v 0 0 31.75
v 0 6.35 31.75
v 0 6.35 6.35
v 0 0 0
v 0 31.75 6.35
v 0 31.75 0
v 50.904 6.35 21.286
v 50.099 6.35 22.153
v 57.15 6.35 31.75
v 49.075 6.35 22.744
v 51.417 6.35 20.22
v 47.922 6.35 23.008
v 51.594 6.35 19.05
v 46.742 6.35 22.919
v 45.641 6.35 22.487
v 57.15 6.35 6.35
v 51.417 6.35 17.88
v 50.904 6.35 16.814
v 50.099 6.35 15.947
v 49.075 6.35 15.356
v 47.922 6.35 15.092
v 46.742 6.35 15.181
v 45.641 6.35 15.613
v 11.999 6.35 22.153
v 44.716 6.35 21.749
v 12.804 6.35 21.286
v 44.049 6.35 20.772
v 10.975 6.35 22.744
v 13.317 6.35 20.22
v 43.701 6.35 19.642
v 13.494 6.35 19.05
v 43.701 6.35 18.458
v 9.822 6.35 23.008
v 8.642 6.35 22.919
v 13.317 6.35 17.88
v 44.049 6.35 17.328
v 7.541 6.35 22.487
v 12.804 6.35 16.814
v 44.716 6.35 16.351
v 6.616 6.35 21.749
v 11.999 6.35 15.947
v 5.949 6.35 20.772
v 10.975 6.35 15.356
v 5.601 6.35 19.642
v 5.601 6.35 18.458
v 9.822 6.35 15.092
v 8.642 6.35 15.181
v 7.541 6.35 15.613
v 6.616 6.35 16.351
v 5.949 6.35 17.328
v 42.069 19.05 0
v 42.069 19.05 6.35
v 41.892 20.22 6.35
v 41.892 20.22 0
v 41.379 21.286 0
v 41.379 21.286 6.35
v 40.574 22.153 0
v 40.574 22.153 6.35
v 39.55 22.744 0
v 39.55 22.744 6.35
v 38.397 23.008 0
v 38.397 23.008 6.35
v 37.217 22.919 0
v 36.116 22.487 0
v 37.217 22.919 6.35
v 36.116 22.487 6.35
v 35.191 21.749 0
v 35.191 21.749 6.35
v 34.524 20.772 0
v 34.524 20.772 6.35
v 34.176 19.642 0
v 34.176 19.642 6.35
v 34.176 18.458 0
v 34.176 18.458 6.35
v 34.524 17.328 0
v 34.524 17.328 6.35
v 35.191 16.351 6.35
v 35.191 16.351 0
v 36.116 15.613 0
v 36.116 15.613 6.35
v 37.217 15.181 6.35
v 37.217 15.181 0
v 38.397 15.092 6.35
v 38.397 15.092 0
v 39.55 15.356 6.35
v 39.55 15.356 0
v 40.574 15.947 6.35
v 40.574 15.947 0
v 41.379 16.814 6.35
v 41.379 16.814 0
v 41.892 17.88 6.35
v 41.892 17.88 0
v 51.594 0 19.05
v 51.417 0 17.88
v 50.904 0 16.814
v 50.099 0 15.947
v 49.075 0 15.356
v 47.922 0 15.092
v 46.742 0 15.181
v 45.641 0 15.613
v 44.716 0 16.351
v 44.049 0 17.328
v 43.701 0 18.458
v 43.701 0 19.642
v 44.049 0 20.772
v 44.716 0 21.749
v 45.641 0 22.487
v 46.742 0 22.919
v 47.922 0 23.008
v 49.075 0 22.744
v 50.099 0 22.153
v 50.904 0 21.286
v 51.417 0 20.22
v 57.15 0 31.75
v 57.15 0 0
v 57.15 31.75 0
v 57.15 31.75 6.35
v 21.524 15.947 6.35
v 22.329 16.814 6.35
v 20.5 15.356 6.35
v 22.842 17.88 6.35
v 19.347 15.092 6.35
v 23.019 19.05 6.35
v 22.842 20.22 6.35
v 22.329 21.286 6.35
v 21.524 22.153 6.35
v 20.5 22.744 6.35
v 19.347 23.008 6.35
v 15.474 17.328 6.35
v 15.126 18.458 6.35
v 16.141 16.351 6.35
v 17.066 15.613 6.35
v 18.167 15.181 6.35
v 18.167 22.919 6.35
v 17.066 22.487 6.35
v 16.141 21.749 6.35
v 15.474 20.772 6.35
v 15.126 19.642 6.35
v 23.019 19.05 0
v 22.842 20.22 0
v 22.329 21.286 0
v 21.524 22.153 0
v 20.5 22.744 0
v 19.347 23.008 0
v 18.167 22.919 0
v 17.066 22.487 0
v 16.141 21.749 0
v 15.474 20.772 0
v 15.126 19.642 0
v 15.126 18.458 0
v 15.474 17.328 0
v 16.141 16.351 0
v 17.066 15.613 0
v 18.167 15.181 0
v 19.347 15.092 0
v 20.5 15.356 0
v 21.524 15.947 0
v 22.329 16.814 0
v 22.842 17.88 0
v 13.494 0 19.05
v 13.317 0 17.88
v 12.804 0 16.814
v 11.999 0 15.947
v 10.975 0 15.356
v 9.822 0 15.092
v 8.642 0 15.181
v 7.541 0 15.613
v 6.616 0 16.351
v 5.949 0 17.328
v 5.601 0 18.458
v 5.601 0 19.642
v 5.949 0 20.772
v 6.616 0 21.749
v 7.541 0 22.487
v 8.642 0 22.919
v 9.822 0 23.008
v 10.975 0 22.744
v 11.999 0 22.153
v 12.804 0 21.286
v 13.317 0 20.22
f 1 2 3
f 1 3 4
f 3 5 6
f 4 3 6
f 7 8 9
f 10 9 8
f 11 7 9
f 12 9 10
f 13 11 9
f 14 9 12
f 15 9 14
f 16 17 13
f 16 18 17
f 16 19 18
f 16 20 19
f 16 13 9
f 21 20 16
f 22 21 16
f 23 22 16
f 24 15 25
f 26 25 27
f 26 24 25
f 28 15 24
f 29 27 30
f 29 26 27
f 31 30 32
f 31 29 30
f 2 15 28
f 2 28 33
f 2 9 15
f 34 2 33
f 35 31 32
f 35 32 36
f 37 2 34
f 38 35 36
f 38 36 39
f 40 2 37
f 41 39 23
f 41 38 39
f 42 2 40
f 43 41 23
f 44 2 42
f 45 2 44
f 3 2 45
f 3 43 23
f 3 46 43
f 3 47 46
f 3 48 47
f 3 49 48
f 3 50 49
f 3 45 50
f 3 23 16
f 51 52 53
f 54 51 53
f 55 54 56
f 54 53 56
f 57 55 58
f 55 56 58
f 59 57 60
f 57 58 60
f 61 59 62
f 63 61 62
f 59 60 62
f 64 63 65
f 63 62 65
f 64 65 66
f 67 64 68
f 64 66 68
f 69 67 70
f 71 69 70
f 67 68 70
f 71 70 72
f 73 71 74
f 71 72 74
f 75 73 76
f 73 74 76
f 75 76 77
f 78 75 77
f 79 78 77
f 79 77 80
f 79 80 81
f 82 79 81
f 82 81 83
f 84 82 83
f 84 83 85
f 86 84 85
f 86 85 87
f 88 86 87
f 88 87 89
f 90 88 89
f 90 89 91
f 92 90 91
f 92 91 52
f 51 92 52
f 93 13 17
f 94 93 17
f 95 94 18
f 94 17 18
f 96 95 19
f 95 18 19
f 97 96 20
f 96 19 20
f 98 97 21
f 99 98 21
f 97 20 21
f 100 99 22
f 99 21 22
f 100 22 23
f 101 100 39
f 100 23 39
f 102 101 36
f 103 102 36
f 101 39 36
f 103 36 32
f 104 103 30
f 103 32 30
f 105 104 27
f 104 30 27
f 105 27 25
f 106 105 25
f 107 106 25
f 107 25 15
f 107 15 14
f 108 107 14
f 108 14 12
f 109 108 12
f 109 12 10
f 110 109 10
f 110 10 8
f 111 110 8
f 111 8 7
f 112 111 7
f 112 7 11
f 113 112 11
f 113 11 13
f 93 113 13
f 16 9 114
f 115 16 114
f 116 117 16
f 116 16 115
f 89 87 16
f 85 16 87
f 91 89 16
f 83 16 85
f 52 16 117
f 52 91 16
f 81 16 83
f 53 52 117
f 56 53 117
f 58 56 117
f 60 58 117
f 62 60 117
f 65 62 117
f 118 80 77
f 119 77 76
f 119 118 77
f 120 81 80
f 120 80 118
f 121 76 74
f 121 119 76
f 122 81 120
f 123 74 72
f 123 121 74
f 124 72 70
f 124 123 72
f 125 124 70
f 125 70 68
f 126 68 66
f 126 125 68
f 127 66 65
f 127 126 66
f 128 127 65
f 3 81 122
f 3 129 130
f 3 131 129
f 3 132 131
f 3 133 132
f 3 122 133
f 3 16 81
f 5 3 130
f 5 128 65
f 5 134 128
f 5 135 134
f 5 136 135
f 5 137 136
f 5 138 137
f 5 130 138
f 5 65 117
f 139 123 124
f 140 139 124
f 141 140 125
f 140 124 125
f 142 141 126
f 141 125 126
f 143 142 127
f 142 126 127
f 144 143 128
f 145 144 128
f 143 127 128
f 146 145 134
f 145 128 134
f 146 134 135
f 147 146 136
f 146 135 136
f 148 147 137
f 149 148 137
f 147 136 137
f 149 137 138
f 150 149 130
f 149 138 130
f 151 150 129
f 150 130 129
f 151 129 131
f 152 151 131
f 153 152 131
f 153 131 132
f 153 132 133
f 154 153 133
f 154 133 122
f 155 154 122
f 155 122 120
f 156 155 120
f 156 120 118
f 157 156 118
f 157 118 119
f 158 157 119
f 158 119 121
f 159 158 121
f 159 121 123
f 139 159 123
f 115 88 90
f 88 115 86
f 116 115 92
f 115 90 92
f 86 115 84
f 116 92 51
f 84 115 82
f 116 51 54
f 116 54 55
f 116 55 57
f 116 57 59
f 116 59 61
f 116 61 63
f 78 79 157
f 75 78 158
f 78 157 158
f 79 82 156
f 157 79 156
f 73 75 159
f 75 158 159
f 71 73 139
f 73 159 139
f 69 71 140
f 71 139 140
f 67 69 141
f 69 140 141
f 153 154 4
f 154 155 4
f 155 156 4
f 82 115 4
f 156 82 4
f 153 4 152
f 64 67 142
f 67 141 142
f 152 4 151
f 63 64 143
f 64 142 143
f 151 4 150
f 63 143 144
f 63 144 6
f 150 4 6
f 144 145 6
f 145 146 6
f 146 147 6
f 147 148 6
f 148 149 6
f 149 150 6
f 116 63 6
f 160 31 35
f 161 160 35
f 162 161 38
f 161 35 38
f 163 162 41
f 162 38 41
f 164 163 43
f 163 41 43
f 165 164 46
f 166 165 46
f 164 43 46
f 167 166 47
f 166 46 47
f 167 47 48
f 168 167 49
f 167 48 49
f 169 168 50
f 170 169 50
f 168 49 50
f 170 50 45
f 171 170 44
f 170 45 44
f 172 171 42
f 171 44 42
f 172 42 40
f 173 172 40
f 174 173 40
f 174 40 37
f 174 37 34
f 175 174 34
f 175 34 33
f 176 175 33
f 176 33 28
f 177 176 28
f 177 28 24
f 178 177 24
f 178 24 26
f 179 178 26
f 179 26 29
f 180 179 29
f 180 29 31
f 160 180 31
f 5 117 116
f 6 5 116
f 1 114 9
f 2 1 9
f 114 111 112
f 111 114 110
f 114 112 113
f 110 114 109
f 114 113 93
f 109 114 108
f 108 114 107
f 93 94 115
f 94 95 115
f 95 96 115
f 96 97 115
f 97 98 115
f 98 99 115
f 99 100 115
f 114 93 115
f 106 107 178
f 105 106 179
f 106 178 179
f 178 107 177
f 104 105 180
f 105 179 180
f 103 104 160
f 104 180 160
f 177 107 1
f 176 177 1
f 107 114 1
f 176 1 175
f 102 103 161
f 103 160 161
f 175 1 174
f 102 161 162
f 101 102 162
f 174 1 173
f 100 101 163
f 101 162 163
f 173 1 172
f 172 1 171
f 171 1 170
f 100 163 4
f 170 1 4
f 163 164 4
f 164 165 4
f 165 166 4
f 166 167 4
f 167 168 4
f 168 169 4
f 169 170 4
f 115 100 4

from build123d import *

# Parameters (mm, degrees)
SKETCH1_W           = 25.4
SKETCH1_H           = 6.35
SKETCH1_W_2         = 6.35
SKETCH1_H_2         = 31.75
BOSS_EXTRUDE1_DEPTH = 57.15
CUT_EXTRUDE1_REACH  = 8.35
SKETCH2_R           = 3.96875
CUT_EXTRUDE2_REACH  = 8.35
SKETCH3_R           = 3.96875


with BuildPart() as part:
    # Sketch1 → Boss-Extrude1 (new body)
    with BuildSketch(Plane(origin=(0, 0, 0), x_dir=(0, 0, -1), z_dir=(1, 0, 0))):
        with Locations((-19.05, 3.175)):
            Rectangle(SKETCH1_W, SKETCH1_H)
        with Locations((-3.175, 15.875)):
            Rectangle(SKETCH1_W_2, SKETCH1_H_2)
    extrude(amount=BOSS_EXTRUDE1_DEPTH)

    # Sketch2 → Cut-Extrude1 (cut, up to next)
    with BuildSketch(Plane.XY.offset(6.35), mode=Mode.PRIVATE) as cut_extrude1_sk1:
        with Locations((19.05, 19.05)):
            Circle(SKETCH2_R)
    cut_extrude1_tool1 = extrude(cut_extrude1_sk1.sketch, amount=-CUT_EXTRUDE1_REACH, mode=Mode.PRIVATE) & part.part
    add(cut_extrude1_tool1.solids().sort_by_distance((19.05, 19.05, 6.35))[0], mode=Mode.SUBTRACT)
    # Sketch2 → Cut-Extrude1 (cut, up to next)
    with BuildSketch(Plane.XY.offset(6.35), mode=Mode.PRIVATE) as cut_extrude1_sk2:
        with Locations((38.1, 19.05)):
            Circle(SKETCH2_R)
    cut_extrude1_tool2 = extrude(cut_extrude1_sk2.sketch, amount=-CUT_EXTRUDE1_REACH, mode=Mode.PRIVATE) & part.part
    add(cut_extrude1_tool2.solids().sort_by_distance((38.1, 19.05, 6.35))[0], mode=Mode.SUBTRACT)

    # Sketch3 → Cut-Extrude2 (cut, up to next)
    with BuildSketch(Plane(origin=(0, 6.35, 0), x_dir=(1, 0, 0), z_dir=(0, 1, 0)), mode=Mode.PRIVATE) as cut_extrude2_sk1:
        with Locations((9.525, -19.05)):
            Circle(SKETCH3_R)
    cut_extrude2_tool1 = extrude(cut_extrude2_sk1.sketch, amount=-CUT_EXTRUDE2_REACH, mode=Mode.PRIVATE) & part.part
    add(cut_extrude2_tool1.solids().sort_by_distance((9.525, 6.35, 19.05))[0], mode=Mode.SUBTRACT)
    # Sketch3 → Cut-Extrude2 (cut, up to next)
    with BuildSketch(Plane(origin=(0, 6.35, 0), x_dir=(1, 0, 0), z_dir=(0, 1, 0)), mode=Mode.PRIVATE) as cut_extrude2_sk2:
        with Locations((47.625, -19.05)):
            Circle(SKETCH3_R)
    cut_extrude2_tool2 = extrude(cut_extrude2_sk2.sketch, amount=-CUT_EXTRUDE2_REACH, mode=Mode.PRIVATE) & part.part
    add(cut_extrude2_tool2.solids().sort_by_distance((47.625, 6.35, 19.05))[0], mode=Mode.SUBTRACT)


solid = part.part
